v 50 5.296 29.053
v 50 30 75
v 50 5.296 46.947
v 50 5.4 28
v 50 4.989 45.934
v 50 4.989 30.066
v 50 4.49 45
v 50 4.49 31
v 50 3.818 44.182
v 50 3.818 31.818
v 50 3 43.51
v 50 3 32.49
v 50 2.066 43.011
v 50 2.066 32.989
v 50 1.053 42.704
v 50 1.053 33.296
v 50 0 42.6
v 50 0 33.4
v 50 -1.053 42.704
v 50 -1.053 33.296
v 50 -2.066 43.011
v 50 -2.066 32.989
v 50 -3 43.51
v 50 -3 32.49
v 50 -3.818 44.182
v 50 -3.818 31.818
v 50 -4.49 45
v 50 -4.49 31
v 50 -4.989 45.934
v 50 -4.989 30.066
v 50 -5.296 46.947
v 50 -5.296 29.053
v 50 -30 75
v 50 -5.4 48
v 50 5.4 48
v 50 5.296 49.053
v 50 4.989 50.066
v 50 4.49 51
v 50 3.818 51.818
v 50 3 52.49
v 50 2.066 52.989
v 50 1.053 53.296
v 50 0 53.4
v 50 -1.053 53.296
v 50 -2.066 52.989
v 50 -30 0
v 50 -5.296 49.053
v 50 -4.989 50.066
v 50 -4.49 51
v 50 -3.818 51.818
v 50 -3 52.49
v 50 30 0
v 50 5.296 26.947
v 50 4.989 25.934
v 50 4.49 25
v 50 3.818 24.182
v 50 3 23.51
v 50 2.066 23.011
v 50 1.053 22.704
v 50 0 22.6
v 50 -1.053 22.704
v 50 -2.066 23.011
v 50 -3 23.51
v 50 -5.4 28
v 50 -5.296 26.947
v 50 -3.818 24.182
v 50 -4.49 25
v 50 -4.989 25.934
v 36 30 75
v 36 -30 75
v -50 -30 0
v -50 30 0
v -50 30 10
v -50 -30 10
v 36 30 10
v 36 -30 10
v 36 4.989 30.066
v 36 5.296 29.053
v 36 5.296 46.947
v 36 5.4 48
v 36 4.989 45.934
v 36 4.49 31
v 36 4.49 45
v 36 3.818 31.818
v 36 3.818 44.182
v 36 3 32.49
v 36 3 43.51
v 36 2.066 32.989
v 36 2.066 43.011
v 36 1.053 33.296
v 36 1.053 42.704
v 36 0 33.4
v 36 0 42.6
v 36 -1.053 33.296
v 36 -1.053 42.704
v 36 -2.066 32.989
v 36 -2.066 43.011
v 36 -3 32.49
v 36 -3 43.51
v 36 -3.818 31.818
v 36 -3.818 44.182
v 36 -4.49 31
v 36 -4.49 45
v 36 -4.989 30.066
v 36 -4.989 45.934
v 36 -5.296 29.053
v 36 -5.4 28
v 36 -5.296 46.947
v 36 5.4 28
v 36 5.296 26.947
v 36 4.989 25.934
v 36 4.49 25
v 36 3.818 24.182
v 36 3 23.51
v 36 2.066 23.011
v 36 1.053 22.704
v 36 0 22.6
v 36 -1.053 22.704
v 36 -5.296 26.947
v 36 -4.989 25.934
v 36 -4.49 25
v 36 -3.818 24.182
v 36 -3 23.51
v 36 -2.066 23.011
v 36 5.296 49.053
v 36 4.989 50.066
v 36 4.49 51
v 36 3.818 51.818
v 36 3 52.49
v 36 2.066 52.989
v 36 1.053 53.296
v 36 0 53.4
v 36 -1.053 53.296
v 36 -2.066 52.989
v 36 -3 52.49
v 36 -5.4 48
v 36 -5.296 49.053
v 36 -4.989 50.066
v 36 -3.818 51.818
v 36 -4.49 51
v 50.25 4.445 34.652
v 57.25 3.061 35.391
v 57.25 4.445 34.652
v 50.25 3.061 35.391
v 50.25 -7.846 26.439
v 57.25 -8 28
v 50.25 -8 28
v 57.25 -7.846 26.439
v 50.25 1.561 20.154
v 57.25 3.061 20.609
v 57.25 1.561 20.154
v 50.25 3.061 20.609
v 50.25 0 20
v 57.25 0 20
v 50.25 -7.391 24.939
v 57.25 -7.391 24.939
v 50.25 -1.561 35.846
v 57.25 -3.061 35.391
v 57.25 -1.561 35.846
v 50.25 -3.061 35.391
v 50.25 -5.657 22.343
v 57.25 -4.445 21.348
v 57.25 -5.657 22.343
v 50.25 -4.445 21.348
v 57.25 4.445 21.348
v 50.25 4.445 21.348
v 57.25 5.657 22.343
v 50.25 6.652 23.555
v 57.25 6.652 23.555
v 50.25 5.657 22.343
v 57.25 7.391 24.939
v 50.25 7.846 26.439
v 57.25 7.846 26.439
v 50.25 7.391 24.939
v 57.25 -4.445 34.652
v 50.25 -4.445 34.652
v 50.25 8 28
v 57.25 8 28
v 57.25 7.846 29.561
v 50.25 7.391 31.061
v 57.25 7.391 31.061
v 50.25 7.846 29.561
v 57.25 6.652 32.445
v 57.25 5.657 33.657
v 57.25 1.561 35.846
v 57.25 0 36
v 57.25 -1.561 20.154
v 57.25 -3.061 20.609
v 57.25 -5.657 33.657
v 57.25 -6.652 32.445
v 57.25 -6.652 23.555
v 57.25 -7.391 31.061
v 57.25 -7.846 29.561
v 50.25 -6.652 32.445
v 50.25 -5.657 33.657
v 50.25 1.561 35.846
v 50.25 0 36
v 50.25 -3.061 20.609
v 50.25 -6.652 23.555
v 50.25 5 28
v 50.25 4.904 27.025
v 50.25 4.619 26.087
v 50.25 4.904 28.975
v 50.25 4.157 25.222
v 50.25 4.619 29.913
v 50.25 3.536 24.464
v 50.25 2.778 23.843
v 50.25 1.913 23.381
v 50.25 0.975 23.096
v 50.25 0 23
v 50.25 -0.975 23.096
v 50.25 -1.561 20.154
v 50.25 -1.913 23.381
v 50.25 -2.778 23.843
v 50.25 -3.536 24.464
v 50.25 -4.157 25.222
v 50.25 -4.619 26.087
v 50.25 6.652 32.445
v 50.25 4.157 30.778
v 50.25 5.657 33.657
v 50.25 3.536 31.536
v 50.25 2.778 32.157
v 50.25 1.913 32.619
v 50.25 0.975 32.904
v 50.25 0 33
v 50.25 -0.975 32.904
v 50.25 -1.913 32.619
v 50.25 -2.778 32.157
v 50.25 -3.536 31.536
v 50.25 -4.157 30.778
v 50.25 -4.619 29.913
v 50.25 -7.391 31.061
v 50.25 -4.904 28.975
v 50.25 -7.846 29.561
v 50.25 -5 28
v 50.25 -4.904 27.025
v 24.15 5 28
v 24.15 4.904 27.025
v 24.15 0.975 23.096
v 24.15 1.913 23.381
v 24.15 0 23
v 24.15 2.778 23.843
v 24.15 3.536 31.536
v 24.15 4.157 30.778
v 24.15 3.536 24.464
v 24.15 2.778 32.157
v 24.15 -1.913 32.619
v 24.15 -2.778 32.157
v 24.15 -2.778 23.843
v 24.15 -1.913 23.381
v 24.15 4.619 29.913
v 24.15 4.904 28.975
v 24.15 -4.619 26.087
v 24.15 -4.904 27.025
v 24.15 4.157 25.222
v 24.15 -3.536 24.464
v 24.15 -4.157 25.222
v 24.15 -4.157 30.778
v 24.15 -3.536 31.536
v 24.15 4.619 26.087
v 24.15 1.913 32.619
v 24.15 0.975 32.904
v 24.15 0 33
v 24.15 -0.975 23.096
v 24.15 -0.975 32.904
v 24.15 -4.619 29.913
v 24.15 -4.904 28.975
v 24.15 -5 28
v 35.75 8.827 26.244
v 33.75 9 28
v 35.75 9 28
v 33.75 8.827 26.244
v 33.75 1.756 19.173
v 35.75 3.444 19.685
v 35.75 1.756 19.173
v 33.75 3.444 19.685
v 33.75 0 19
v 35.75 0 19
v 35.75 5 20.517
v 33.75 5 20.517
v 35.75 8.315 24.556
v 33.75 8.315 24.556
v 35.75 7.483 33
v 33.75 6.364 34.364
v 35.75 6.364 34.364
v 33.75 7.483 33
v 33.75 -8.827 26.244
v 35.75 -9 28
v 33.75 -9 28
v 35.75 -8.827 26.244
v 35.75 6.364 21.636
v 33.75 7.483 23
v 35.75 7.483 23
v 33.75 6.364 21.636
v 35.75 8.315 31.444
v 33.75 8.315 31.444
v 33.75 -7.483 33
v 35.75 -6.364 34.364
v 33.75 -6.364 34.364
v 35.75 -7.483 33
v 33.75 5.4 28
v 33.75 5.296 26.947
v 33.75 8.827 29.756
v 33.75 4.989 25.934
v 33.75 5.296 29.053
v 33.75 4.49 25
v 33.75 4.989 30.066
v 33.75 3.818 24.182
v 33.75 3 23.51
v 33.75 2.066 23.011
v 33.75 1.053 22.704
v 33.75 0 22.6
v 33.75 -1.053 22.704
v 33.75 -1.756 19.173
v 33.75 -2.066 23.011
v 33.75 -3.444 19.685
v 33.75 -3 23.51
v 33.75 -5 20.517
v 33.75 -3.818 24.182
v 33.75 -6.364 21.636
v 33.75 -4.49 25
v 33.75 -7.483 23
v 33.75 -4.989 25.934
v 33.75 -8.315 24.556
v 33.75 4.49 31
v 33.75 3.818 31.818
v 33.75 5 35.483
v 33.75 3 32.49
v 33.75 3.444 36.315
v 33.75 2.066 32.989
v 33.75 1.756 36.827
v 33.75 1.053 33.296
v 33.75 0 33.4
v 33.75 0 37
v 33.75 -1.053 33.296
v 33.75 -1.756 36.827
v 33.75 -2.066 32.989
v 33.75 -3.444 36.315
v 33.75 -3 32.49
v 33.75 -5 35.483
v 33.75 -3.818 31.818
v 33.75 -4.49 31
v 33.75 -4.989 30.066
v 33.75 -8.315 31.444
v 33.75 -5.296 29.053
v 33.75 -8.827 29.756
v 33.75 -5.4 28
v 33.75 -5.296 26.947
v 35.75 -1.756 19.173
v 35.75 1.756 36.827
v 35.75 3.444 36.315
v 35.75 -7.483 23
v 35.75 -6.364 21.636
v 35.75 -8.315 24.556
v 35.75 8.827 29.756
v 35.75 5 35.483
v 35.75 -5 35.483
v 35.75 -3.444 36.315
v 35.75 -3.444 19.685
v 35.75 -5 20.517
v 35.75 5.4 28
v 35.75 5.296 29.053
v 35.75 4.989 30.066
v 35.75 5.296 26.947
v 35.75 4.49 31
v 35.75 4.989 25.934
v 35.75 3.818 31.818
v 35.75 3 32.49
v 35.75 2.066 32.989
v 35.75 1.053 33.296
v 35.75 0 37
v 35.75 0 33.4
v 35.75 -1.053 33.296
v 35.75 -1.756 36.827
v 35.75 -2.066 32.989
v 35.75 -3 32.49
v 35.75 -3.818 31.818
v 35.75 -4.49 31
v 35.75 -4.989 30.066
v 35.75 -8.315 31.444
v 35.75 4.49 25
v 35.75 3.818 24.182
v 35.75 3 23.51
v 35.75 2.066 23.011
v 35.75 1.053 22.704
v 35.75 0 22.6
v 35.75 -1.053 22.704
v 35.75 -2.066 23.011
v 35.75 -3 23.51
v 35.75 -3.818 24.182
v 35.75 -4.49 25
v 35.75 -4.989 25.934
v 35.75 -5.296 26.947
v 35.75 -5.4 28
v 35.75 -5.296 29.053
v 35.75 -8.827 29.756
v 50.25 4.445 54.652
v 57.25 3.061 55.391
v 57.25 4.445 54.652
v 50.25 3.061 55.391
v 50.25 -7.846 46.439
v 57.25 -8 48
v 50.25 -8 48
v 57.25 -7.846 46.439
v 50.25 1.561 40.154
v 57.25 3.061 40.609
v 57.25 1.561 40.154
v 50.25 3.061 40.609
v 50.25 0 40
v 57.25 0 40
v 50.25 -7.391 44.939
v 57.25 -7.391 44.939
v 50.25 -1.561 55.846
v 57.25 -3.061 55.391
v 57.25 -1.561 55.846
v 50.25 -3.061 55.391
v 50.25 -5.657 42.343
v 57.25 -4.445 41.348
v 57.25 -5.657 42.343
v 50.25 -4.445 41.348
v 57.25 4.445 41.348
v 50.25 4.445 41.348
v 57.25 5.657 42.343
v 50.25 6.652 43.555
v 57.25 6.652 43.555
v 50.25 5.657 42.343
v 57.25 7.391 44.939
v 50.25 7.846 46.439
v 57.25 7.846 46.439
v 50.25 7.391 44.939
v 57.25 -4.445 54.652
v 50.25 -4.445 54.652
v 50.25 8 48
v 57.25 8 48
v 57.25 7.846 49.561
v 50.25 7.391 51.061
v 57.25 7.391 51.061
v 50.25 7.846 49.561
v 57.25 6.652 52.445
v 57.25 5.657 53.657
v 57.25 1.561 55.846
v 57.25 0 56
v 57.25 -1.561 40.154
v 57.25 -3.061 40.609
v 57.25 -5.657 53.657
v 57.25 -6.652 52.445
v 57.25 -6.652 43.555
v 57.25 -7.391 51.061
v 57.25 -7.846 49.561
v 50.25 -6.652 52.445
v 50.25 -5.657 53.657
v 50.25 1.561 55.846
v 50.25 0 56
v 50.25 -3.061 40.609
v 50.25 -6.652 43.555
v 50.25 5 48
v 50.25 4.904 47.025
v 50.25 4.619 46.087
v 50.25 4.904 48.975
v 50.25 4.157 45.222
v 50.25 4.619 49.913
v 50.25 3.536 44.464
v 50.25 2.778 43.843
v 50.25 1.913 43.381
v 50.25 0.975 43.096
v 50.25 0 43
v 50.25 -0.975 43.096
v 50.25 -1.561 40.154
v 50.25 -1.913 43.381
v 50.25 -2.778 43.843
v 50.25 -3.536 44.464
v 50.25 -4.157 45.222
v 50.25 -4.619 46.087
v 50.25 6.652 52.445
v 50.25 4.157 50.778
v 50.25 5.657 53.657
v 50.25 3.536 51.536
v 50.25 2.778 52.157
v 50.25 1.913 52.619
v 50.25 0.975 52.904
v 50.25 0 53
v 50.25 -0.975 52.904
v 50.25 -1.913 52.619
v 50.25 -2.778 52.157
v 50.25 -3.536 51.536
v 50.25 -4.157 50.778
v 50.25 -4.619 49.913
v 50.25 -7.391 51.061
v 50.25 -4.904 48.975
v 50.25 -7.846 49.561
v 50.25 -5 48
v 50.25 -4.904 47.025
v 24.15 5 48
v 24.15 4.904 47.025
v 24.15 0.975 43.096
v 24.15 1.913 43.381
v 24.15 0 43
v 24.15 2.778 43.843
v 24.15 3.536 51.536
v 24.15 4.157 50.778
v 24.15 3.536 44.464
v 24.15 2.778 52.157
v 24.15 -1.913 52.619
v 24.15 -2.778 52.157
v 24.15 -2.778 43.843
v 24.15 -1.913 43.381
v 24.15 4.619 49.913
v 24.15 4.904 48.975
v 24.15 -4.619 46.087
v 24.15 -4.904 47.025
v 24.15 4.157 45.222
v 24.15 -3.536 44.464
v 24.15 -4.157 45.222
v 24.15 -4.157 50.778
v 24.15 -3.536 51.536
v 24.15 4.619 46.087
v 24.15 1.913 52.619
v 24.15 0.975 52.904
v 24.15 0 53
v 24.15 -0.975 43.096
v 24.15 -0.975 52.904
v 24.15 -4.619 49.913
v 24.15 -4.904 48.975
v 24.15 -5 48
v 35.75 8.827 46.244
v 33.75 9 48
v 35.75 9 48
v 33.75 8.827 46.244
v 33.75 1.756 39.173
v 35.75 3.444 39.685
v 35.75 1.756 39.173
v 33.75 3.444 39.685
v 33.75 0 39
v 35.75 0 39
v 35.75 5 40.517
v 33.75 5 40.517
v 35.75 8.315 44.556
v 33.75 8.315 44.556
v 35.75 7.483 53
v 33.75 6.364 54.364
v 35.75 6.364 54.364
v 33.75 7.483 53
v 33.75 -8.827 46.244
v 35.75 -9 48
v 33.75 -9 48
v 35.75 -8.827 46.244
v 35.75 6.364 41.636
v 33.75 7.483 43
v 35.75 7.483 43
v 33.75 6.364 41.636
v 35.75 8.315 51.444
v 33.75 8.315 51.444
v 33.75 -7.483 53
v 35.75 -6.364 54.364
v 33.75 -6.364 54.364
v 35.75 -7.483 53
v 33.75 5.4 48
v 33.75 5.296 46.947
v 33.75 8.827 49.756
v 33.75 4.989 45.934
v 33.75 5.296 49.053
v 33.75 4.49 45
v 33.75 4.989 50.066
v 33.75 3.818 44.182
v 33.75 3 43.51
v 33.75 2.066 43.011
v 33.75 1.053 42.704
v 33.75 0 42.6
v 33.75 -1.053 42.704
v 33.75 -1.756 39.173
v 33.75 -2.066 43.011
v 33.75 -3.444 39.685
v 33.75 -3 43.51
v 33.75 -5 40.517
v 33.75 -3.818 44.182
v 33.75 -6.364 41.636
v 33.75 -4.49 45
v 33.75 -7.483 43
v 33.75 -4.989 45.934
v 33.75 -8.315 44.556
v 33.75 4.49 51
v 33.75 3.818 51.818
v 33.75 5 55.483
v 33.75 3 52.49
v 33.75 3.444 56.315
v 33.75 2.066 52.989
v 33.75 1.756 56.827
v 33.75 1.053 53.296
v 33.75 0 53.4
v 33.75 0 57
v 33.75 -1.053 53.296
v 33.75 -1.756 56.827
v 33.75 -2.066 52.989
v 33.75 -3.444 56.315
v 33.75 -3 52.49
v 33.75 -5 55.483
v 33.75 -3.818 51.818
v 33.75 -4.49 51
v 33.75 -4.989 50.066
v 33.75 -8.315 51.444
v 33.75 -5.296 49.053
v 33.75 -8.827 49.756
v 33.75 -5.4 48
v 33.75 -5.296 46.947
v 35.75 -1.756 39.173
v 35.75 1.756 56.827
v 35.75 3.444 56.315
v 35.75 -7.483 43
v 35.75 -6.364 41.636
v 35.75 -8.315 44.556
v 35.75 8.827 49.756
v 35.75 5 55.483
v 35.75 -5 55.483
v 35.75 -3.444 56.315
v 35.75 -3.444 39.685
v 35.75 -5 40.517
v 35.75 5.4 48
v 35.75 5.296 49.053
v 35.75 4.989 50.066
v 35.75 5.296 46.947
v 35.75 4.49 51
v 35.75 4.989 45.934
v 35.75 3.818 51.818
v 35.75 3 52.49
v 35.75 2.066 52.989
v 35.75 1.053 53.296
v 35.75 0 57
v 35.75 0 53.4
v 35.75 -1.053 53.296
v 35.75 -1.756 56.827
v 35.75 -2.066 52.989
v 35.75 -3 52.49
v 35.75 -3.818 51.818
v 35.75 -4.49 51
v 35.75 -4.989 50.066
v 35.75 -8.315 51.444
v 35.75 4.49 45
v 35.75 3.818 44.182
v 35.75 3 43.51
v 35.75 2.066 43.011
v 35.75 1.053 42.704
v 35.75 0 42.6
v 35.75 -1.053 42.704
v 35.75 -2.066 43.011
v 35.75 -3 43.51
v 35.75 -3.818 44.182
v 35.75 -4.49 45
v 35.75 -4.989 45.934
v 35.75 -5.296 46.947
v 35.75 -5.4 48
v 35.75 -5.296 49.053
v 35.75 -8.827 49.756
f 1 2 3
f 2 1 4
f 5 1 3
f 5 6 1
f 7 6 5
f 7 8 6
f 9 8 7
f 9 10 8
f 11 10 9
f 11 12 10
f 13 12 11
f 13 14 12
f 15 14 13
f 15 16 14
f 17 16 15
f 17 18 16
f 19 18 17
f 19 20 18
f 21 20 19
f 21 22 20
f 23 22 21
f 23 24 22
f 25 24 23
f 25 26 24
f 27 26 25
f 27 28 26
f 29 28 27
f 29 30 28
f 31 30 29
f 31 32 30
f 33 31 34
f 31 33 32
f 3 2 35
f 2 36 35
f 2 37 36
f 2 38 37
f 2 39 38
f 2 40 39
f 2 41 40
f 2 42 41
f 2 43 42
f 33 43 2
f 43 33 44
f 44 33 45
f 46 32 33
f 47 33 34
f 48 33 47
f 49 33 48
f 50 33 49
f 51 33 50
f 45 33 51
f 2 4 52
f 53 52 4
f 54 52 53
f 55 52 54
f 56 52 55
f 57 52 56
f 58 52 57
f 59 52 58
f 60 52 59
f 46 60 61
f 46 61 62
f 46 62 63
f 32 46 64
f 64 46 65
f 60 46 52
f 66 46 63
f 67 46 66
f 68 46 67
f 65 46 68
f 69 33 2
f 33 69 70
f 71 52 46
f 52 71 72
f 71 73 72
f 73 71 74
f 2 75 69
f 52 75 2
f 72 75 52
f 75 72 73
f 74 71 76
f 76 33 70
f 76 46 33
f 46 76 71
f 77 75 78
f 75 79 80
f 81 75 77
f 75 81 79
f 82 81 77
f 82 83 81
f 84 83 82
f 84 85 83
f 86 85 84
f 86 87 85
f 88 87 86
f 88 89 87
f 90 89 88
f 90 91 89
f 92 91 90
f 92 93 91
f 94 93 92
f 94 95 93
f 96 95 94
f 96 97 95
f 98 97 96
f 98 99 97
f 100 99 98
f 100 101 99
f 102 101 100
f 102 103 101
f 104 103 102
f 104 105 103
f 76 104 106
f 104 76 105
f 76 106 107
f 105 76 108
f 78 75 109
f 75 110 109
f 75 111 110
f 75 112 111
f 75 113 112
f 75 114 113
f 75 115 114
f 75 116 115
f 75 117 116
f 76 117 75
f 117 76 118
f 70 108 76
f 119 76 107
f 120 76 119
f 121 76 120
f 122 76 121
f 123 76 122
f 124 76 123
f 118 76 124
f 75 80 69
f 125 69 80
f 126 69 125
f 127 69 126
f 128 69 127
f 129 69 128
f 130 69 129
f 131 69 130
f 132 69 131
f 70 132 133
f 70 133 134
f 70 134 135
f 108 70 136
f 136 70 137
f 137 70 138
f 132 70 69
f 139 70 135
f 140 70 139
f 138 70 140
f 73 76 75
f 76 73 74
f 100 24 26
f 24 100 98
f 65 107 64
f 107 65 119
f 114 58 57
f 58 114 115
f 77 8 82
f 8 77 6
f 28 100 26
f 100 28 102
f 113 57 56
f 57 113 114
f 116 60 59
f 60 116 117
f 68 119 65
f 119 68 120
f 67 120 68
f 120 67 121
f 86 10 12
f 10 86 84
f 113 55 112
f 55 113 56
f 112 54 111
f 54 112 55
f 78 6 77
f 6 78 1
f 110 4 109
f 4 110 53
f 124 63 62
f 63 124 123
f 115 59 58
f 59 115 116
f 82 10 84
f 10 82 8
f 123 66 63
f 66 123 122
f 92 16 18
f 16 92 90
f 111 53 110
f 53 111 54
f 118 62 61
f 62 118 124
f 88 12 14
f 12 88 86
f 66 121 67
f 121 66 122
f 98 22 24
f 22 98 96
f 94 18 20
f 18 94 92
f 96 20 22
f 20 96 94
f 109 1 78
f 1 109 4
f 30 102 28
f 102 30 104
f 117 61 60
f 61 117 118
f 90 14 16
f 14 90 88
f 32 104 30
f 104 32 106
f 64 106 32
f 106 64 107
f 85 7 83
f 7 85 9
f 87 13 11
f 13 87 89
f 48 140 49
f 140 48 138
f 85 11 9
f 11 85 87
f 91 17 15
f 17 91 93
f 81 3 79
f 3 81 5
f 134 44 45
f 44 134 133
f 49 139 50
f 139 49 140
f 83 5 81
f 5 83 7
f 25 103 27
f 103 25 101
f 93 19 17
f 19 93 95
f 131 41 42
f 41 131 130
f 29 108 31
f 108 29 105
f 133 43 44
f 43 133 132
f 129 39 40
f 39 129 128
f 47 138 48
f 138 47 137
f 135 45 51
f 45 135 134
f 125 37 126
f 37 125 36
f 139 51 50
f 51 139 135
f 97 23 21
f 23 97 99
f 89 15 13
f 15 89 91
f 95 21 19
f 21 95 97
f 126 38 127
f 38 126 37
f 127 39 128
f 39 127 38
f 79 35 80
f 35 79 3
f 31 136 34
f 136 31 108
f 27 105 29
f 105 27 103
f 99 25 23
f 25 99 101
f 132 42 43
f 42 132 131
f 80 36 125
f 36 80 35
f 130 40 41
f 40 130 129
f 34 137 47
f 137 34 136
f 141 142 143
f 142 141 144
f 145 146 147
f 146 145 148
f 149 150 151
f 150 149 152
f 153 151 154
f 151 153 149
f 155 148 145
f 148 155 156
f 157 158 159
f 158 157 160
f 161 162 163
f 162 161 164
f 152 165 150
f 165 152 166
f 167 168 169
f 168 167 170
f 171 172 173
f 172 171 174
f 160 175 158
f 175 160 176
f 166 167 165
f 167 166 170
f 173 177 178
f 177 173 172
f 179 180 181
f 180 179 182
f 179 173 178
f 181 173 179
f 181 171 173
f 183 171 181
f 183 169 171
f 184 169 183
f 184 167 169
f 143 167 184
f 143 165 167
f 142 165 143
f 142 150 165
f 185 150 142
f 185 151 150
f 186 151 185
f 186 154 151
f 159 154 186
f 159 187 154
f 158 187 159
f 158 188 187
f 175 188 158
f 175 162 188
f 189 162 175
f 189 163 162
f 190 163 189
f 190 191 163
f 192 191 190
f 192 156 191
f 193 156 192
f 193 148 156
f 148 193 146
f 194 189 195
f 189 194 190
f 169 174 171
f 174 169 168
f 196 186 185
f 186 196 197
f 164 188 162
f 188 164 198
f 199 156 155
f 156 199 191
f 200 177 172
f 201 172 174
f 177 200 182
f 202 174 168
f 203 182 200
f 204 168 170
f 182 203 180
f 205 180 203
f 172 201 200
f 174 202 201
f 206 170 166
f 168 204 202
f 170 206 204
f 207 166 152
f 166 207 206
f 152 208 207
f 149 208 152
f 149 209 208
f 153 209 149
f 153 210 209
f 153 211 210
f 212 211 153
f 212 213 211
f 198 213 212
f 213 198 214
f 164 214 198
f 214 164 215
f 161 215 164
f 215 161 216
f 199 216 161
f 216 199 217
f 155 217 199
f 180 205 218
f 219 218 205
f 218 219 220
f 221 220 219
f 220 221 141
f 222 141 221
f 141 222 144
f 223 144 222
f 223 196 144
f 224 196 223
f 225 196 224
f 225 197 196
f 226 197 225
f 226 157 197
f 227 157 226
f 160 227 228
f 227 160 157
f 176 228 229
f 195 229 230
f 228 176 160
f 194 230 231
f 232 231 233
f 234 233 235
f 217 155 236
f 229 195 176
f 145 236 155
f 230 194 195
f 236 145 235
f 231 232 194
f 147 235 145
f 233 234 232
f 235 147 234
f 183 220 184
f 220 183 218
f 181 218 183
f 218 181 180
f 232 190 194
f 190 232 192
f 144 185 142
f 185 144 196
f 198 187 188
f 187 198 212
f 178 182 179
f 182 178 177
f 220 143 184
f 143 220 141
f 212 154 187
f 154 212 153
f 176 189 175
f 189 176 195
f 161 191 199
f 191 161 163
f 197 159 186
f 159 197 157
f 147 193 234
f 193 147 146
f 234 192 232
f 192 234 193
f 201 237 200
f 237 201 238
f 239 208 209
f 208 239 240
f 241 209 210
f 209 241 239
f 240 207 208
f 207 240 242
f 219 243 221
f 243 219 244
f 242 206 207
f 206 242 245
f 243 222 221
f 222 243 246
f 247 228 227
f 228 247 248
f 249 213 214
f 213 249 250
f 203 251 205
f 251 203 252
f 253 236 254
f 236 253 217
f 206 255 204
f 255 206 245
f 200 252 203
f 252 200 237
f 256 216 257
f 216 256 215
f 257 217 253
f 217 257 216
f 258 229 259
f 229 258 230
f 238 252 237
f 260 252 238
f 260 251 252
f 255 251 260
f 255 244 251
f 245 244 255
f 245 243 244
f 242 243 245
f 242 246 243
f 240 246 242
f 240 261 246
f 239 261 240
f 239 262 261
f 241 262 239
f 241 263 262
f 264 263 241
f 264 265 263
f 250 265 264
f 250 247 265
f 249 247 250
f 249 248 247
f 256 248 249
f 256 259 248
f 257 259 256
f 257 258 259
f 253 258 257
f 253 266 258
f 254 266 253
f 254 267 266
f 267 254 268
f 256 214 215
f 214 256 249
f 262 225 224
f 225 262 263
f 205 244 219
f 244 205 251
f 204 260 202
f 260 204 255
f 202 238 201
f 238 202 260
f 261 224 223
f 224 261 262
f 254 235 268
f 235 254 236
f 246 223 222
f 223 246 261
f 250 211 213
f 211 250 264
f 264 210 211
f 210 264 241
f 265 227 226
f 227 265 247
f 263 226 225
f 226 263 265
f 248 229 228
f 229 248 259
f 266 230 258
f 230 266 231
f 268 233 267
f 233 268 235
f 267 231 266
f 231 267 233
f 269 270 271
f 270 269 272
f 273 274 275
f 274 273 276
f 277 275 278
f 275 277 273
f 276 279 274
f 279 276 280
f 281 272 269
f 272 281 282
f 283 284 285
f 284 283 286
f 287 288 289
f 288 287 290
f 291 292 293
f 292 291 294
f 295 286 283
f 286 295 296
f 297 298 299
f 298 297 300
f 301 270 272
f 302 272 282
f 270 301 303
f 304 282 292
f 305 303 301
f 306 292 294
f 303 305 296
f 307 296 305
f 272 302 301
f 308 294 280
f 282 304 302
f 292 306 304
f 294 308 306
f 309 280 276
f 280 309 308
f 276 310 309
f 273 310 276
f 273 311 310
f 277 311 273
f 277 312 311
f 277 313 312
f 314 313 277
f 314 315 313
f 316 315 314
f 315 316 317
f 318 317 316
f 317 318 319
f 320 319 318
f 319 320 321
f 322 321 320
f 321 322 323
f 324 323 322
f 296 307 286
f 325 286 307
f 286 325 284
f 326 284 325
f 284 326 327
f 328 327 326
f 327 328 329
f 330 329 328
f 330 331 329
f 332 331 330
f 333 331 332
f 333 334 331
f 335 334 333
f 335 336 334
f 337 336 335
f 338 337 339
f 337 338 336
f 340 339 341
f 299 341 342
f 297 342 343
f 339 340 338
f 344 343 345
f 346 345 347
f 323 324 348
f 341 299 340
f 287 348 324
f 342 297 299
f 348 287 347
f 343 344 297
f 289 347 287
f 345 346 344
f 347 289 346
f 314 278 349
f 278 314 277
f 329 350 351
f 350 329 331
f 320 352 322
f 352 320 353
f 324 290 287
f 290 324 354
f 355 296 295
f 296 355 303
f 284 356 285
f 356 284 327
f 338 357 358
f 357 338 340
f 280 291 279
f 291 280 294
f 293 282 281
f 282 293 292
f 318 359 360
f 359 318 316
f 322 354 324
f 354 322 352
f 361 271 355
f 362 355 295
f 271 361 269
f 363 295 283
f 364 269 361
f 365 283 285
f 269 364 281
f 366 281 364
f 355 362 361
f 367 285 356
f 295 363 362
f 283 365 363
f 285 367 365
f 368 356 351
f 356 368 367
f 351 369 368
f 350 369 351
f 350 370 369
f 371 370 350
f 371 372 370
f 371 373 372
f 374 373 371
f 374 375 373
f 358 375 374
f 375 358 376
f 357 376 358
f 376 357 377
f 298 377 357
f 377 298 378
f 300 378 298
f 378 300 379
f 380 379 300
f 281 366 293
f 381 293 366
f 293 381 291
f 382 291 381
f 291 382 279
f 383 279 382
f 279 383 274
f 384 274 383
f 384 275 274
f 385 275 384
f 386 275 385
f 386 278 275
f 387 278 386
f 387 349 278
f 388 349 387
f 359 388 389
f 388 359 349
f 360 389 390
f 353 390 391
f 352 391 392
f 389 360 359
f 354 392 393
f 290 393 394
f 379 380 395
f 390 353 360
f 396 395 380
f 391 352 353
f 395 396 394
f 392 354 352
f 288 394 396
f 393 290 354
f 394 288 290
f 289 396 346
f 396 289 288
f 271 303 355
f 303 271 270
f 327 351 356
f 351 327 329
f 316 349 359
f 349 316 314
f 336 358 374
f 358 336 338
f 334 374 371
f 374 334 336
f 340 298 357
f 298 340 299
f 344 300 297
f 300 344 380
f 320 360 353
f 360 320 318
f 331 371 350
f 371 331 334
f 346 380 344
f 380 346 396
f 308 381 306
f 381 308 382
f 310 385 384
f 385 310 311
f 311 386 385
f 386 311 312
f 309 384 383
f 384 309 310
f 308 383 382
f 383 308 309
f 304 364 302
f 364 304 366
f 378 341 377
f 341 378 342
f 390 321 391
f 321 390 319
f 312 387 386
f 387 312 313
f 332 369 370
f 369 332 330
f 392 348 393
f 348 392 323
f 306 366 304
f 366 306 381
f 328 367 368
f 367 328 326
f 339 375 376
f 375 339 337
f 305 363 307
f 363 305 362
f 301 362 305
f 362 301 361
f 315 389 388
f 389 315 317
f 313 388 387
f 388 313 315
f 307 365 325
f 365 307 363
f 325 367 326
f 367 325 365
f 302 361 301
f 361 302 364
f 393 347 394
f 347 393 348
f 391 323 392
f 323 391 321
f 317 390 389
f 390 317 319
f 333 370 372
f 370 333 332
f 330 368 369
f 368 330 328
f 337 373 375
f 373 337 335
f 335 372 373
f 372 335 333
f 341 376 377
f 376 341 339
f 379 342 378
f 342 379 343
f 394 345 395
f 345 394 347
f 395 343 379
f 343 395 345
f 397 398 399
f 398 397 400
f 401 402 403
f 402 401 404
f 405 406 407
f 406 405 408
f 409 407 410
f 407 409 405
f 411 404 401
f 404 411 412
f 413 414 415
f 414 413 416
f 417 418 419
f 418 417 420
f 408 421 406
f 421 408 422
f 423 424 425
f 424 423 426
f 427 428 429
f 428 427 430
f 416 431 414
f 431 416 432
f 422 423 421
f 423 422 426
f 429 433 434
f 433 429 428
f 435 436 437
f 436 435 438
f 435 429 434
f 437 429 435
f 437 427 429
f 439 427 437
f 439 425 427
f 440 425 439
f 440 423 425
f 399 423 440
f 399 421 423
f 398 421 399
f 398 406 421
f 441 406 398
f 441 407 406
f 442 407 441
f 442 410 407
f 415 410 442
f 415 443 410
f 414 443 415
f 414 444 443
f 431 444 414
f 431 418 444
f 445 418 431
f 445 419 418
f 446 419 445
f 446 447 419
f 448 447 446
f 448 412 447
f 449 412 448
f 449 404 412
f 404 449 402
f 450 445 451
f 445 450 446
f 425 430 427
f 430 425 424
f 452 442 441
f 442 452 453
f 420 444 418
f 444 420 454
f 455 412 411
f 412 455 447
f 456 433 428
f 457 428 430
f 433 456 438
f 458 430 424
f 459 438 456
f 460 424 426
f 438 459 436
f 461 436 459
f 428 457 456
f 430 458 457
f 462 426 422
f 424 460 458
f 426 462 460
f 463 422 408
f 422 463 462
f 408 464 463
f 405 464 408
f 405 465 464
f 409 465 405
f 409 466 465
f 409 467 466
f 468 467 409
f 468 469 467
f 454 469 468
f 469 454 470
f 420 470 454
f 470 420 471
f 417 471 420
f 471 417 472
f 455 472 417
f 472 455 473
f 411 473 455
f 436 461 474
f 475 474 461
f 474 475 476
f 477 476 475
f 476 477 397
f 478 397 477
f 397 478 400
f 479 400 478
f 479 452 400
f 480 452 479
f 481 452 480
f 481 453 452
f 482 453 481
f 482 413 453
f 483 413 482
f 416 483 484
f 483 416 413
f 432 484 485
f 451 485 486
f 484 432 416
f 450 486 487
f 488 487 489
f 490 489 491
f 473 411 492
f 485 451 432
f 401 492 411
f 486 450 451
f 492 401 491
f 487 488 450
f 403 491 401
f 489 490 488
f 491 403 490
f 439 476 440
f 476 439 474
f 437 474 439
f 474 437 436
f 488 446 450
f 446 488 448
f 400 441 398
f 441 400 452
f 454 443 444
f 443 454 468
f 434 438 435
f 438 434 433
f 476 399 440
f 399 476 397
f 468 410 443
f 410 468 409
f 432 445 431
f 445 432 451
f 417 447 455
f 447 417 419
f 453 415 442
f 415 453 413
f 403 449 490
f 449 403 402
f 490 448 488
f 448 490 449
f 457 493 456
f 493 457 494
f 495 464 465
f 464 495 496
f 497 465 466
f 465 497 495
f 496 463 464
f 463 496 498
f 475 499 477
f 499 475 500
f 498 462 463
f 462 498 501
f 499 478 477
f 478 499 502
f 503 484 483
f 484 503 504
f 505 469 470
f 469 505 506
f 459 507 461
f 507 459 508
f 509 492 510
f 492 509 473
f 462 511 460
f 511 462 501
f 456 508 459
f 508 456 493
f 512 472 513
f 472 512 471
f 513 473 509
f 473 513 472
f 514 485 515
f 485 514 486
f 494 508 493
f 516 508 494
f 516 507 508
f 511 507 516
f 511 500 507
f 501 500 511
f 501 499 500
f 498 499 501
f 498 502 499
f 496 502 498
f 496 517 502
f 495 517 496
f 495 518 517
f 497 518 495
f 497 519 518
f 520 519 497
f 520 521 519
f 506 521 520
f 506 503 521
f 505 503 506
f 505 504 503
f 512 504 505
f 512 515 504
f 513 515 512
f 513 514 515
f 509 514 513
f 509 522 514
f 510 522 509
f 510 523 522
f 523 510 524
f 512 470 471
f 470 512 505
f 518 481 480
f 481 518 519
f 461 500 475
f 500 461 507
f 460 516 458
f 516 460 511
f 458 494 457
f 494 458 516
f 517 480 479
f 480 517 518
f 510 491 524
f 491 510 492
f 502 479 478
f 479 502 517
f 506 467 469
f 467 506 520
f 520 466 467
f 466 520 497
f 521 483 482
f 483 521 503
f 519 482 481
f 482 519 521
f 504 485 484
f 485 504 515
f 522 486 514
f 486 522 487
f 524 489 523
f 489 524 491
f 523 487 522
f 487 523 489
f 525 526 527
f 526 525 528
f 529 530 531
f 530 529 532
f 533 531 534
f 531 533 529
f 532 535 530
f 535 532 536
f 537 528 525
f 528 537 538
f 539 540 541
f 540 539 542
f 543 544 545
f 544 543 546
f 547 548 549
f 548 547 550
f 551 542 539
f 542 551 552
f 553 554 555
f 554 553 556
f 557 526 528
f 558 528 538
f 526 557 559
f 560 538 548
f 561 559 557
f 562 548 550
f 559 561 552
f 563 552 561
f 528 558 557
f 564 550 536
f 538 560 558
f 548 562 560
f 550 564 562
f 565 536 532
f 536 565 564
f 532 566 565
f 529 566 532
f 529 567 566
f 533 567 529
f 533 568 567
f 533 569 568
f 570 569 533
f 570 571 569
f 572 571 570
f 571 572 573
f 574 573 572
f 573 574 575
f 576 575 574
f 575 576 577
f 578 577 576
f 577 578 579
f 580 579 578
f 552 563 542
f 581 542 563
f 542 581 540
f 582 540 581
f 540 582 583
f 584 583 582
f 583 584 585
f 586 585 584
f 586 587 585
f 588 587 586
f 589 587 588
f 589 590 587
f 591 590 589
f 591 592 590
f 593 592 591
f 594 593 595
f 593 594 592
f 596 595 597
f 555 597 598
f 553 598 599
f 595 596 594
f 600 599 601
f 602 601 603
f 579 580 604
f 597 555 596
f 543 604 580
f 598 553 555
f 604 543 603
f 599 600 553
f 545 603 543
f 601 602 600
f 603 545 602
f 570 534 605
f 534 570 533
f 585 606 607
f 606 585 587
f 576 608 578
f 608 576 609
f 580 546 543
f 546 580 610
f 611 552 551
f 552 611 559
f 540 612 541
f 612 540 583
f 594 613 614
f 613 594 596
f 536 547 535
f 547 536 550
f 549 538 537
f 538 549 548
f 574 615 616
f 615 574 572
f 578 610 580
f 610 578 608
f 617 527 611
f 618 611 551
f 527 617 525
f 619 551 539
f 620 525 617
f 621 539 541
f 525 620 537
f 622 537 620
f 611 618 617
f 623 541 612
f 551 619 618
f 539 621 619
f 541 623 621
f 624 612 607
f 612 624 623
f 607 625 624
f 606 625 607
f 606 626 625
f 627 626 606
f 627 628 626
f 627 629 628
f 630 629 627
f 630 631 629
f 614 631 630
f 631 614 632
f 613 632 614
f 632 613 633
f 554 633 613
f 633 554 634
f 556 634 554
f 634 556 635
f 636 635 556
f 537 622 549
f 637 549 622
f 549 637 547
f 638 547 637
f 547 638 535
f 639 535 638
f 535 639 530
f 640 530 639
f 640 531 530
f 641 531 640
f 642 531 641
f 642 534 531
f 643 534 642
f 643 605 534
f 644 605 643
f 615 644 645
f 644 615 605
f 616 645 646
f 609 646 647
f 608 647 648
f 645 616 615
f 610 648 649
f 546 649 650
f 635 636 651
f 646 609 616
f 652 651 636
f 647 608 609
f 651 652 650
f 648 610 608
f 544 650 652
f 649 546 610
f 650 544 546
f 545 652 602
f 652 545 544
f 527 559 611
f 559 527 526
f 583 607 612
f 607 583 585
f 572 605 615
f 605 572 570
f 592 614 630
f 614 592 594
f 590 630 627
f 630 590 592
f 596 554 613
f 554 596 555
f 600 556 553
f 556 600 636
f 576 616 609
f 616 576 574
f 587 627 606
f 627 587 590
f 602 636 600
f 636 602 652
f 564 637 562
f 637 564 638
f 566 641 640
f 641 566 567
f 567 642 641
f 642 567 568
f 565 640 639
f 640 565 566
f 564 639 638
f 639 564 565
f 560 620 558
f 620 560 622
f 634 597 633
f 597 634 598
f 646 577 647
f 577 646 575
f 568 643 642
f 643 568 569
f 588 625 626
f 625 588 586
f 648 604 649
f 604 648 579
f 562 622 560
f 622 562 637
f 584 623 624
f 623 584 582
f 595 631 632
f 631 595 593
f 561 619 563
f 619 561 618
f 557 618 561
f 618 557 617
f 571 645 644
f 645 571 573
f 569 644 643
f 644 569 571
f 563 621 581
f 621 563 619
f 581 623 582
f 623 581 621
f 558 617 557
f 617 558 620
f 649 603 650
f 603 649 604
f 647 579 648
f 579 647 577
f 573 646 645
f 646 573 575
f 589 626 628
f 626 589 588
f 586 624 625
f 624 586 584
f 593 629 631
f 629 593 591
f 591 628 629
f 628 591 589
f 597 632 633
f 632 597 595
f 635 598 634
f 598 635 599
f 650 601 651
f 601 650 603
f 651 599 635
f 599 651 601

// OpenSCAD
$fn = 32;

// ------------------------------------------------------------------------
// Bolted bracket: 100 x 60 mm bracket with 2 bolt joints
// Every part is its own module, assembly() places them once.
// ------------------------------------------------------------------------

// --- part 1 ---
module bracket() {
  difference() {
    translate([-50, -30, 0]) cube([100, 60, 75]);
    translate([-51, -31, 10]) cube([87, 62, 66]);
    translate([43, 0, 28]) rotate([0, 90, 0]) cylinder(h = 16, d = 10.8, center = true);
    translate([43, 0, 48]) rotate([0, 90, 0]) cylinder(h = 16, d = 10.8, center = true);
  }
}

// --- part 2 ---
module bolt1() {
  cylinder(h = 7, d = 16);
  translate([0, 0, -26.1]) cylinder(h = 26.1, d = 10);
}

// --- part 3 ---
module washer1() {
  difference() {
      translate([0, 0, 0]) cylinder(h = 2, d = 18);
      translate([0, 0, -1]) cylinder(h = 4, d = 10.8);
    }
}

// --- part 4 ---
module bolt2() {
  cylinder(h = 7, d = 16);
  translate([0, 0, -26.1]) cylinder(h = 26.1, d = 10);
}

// --- part 5 ---
module washer2() {
  difference() {
      translate([0, 0, 0]) cylinder(h = 2, d = 18);
      translate([0, 0, -1]) cylinder(h = 4, d = 10.8);
    }
}

// --- assembly ---
module assembly() {
  translate([0, 0, 0]) rotate([0, 0, 0]) bracket();
  translate([50.25, 0, 28]) rotate([0, 90, 0]) bolt1();
  translate([33.75, 0, 28]) rotate([0, 90, 0]) washer1();
  translate([50.25, 0, 48]) rotate([0, 90, 0]) bolt2();
  translate([33.75, 0, 48]) rotate([0, 90, 0]) washer2();
}

assembly();
